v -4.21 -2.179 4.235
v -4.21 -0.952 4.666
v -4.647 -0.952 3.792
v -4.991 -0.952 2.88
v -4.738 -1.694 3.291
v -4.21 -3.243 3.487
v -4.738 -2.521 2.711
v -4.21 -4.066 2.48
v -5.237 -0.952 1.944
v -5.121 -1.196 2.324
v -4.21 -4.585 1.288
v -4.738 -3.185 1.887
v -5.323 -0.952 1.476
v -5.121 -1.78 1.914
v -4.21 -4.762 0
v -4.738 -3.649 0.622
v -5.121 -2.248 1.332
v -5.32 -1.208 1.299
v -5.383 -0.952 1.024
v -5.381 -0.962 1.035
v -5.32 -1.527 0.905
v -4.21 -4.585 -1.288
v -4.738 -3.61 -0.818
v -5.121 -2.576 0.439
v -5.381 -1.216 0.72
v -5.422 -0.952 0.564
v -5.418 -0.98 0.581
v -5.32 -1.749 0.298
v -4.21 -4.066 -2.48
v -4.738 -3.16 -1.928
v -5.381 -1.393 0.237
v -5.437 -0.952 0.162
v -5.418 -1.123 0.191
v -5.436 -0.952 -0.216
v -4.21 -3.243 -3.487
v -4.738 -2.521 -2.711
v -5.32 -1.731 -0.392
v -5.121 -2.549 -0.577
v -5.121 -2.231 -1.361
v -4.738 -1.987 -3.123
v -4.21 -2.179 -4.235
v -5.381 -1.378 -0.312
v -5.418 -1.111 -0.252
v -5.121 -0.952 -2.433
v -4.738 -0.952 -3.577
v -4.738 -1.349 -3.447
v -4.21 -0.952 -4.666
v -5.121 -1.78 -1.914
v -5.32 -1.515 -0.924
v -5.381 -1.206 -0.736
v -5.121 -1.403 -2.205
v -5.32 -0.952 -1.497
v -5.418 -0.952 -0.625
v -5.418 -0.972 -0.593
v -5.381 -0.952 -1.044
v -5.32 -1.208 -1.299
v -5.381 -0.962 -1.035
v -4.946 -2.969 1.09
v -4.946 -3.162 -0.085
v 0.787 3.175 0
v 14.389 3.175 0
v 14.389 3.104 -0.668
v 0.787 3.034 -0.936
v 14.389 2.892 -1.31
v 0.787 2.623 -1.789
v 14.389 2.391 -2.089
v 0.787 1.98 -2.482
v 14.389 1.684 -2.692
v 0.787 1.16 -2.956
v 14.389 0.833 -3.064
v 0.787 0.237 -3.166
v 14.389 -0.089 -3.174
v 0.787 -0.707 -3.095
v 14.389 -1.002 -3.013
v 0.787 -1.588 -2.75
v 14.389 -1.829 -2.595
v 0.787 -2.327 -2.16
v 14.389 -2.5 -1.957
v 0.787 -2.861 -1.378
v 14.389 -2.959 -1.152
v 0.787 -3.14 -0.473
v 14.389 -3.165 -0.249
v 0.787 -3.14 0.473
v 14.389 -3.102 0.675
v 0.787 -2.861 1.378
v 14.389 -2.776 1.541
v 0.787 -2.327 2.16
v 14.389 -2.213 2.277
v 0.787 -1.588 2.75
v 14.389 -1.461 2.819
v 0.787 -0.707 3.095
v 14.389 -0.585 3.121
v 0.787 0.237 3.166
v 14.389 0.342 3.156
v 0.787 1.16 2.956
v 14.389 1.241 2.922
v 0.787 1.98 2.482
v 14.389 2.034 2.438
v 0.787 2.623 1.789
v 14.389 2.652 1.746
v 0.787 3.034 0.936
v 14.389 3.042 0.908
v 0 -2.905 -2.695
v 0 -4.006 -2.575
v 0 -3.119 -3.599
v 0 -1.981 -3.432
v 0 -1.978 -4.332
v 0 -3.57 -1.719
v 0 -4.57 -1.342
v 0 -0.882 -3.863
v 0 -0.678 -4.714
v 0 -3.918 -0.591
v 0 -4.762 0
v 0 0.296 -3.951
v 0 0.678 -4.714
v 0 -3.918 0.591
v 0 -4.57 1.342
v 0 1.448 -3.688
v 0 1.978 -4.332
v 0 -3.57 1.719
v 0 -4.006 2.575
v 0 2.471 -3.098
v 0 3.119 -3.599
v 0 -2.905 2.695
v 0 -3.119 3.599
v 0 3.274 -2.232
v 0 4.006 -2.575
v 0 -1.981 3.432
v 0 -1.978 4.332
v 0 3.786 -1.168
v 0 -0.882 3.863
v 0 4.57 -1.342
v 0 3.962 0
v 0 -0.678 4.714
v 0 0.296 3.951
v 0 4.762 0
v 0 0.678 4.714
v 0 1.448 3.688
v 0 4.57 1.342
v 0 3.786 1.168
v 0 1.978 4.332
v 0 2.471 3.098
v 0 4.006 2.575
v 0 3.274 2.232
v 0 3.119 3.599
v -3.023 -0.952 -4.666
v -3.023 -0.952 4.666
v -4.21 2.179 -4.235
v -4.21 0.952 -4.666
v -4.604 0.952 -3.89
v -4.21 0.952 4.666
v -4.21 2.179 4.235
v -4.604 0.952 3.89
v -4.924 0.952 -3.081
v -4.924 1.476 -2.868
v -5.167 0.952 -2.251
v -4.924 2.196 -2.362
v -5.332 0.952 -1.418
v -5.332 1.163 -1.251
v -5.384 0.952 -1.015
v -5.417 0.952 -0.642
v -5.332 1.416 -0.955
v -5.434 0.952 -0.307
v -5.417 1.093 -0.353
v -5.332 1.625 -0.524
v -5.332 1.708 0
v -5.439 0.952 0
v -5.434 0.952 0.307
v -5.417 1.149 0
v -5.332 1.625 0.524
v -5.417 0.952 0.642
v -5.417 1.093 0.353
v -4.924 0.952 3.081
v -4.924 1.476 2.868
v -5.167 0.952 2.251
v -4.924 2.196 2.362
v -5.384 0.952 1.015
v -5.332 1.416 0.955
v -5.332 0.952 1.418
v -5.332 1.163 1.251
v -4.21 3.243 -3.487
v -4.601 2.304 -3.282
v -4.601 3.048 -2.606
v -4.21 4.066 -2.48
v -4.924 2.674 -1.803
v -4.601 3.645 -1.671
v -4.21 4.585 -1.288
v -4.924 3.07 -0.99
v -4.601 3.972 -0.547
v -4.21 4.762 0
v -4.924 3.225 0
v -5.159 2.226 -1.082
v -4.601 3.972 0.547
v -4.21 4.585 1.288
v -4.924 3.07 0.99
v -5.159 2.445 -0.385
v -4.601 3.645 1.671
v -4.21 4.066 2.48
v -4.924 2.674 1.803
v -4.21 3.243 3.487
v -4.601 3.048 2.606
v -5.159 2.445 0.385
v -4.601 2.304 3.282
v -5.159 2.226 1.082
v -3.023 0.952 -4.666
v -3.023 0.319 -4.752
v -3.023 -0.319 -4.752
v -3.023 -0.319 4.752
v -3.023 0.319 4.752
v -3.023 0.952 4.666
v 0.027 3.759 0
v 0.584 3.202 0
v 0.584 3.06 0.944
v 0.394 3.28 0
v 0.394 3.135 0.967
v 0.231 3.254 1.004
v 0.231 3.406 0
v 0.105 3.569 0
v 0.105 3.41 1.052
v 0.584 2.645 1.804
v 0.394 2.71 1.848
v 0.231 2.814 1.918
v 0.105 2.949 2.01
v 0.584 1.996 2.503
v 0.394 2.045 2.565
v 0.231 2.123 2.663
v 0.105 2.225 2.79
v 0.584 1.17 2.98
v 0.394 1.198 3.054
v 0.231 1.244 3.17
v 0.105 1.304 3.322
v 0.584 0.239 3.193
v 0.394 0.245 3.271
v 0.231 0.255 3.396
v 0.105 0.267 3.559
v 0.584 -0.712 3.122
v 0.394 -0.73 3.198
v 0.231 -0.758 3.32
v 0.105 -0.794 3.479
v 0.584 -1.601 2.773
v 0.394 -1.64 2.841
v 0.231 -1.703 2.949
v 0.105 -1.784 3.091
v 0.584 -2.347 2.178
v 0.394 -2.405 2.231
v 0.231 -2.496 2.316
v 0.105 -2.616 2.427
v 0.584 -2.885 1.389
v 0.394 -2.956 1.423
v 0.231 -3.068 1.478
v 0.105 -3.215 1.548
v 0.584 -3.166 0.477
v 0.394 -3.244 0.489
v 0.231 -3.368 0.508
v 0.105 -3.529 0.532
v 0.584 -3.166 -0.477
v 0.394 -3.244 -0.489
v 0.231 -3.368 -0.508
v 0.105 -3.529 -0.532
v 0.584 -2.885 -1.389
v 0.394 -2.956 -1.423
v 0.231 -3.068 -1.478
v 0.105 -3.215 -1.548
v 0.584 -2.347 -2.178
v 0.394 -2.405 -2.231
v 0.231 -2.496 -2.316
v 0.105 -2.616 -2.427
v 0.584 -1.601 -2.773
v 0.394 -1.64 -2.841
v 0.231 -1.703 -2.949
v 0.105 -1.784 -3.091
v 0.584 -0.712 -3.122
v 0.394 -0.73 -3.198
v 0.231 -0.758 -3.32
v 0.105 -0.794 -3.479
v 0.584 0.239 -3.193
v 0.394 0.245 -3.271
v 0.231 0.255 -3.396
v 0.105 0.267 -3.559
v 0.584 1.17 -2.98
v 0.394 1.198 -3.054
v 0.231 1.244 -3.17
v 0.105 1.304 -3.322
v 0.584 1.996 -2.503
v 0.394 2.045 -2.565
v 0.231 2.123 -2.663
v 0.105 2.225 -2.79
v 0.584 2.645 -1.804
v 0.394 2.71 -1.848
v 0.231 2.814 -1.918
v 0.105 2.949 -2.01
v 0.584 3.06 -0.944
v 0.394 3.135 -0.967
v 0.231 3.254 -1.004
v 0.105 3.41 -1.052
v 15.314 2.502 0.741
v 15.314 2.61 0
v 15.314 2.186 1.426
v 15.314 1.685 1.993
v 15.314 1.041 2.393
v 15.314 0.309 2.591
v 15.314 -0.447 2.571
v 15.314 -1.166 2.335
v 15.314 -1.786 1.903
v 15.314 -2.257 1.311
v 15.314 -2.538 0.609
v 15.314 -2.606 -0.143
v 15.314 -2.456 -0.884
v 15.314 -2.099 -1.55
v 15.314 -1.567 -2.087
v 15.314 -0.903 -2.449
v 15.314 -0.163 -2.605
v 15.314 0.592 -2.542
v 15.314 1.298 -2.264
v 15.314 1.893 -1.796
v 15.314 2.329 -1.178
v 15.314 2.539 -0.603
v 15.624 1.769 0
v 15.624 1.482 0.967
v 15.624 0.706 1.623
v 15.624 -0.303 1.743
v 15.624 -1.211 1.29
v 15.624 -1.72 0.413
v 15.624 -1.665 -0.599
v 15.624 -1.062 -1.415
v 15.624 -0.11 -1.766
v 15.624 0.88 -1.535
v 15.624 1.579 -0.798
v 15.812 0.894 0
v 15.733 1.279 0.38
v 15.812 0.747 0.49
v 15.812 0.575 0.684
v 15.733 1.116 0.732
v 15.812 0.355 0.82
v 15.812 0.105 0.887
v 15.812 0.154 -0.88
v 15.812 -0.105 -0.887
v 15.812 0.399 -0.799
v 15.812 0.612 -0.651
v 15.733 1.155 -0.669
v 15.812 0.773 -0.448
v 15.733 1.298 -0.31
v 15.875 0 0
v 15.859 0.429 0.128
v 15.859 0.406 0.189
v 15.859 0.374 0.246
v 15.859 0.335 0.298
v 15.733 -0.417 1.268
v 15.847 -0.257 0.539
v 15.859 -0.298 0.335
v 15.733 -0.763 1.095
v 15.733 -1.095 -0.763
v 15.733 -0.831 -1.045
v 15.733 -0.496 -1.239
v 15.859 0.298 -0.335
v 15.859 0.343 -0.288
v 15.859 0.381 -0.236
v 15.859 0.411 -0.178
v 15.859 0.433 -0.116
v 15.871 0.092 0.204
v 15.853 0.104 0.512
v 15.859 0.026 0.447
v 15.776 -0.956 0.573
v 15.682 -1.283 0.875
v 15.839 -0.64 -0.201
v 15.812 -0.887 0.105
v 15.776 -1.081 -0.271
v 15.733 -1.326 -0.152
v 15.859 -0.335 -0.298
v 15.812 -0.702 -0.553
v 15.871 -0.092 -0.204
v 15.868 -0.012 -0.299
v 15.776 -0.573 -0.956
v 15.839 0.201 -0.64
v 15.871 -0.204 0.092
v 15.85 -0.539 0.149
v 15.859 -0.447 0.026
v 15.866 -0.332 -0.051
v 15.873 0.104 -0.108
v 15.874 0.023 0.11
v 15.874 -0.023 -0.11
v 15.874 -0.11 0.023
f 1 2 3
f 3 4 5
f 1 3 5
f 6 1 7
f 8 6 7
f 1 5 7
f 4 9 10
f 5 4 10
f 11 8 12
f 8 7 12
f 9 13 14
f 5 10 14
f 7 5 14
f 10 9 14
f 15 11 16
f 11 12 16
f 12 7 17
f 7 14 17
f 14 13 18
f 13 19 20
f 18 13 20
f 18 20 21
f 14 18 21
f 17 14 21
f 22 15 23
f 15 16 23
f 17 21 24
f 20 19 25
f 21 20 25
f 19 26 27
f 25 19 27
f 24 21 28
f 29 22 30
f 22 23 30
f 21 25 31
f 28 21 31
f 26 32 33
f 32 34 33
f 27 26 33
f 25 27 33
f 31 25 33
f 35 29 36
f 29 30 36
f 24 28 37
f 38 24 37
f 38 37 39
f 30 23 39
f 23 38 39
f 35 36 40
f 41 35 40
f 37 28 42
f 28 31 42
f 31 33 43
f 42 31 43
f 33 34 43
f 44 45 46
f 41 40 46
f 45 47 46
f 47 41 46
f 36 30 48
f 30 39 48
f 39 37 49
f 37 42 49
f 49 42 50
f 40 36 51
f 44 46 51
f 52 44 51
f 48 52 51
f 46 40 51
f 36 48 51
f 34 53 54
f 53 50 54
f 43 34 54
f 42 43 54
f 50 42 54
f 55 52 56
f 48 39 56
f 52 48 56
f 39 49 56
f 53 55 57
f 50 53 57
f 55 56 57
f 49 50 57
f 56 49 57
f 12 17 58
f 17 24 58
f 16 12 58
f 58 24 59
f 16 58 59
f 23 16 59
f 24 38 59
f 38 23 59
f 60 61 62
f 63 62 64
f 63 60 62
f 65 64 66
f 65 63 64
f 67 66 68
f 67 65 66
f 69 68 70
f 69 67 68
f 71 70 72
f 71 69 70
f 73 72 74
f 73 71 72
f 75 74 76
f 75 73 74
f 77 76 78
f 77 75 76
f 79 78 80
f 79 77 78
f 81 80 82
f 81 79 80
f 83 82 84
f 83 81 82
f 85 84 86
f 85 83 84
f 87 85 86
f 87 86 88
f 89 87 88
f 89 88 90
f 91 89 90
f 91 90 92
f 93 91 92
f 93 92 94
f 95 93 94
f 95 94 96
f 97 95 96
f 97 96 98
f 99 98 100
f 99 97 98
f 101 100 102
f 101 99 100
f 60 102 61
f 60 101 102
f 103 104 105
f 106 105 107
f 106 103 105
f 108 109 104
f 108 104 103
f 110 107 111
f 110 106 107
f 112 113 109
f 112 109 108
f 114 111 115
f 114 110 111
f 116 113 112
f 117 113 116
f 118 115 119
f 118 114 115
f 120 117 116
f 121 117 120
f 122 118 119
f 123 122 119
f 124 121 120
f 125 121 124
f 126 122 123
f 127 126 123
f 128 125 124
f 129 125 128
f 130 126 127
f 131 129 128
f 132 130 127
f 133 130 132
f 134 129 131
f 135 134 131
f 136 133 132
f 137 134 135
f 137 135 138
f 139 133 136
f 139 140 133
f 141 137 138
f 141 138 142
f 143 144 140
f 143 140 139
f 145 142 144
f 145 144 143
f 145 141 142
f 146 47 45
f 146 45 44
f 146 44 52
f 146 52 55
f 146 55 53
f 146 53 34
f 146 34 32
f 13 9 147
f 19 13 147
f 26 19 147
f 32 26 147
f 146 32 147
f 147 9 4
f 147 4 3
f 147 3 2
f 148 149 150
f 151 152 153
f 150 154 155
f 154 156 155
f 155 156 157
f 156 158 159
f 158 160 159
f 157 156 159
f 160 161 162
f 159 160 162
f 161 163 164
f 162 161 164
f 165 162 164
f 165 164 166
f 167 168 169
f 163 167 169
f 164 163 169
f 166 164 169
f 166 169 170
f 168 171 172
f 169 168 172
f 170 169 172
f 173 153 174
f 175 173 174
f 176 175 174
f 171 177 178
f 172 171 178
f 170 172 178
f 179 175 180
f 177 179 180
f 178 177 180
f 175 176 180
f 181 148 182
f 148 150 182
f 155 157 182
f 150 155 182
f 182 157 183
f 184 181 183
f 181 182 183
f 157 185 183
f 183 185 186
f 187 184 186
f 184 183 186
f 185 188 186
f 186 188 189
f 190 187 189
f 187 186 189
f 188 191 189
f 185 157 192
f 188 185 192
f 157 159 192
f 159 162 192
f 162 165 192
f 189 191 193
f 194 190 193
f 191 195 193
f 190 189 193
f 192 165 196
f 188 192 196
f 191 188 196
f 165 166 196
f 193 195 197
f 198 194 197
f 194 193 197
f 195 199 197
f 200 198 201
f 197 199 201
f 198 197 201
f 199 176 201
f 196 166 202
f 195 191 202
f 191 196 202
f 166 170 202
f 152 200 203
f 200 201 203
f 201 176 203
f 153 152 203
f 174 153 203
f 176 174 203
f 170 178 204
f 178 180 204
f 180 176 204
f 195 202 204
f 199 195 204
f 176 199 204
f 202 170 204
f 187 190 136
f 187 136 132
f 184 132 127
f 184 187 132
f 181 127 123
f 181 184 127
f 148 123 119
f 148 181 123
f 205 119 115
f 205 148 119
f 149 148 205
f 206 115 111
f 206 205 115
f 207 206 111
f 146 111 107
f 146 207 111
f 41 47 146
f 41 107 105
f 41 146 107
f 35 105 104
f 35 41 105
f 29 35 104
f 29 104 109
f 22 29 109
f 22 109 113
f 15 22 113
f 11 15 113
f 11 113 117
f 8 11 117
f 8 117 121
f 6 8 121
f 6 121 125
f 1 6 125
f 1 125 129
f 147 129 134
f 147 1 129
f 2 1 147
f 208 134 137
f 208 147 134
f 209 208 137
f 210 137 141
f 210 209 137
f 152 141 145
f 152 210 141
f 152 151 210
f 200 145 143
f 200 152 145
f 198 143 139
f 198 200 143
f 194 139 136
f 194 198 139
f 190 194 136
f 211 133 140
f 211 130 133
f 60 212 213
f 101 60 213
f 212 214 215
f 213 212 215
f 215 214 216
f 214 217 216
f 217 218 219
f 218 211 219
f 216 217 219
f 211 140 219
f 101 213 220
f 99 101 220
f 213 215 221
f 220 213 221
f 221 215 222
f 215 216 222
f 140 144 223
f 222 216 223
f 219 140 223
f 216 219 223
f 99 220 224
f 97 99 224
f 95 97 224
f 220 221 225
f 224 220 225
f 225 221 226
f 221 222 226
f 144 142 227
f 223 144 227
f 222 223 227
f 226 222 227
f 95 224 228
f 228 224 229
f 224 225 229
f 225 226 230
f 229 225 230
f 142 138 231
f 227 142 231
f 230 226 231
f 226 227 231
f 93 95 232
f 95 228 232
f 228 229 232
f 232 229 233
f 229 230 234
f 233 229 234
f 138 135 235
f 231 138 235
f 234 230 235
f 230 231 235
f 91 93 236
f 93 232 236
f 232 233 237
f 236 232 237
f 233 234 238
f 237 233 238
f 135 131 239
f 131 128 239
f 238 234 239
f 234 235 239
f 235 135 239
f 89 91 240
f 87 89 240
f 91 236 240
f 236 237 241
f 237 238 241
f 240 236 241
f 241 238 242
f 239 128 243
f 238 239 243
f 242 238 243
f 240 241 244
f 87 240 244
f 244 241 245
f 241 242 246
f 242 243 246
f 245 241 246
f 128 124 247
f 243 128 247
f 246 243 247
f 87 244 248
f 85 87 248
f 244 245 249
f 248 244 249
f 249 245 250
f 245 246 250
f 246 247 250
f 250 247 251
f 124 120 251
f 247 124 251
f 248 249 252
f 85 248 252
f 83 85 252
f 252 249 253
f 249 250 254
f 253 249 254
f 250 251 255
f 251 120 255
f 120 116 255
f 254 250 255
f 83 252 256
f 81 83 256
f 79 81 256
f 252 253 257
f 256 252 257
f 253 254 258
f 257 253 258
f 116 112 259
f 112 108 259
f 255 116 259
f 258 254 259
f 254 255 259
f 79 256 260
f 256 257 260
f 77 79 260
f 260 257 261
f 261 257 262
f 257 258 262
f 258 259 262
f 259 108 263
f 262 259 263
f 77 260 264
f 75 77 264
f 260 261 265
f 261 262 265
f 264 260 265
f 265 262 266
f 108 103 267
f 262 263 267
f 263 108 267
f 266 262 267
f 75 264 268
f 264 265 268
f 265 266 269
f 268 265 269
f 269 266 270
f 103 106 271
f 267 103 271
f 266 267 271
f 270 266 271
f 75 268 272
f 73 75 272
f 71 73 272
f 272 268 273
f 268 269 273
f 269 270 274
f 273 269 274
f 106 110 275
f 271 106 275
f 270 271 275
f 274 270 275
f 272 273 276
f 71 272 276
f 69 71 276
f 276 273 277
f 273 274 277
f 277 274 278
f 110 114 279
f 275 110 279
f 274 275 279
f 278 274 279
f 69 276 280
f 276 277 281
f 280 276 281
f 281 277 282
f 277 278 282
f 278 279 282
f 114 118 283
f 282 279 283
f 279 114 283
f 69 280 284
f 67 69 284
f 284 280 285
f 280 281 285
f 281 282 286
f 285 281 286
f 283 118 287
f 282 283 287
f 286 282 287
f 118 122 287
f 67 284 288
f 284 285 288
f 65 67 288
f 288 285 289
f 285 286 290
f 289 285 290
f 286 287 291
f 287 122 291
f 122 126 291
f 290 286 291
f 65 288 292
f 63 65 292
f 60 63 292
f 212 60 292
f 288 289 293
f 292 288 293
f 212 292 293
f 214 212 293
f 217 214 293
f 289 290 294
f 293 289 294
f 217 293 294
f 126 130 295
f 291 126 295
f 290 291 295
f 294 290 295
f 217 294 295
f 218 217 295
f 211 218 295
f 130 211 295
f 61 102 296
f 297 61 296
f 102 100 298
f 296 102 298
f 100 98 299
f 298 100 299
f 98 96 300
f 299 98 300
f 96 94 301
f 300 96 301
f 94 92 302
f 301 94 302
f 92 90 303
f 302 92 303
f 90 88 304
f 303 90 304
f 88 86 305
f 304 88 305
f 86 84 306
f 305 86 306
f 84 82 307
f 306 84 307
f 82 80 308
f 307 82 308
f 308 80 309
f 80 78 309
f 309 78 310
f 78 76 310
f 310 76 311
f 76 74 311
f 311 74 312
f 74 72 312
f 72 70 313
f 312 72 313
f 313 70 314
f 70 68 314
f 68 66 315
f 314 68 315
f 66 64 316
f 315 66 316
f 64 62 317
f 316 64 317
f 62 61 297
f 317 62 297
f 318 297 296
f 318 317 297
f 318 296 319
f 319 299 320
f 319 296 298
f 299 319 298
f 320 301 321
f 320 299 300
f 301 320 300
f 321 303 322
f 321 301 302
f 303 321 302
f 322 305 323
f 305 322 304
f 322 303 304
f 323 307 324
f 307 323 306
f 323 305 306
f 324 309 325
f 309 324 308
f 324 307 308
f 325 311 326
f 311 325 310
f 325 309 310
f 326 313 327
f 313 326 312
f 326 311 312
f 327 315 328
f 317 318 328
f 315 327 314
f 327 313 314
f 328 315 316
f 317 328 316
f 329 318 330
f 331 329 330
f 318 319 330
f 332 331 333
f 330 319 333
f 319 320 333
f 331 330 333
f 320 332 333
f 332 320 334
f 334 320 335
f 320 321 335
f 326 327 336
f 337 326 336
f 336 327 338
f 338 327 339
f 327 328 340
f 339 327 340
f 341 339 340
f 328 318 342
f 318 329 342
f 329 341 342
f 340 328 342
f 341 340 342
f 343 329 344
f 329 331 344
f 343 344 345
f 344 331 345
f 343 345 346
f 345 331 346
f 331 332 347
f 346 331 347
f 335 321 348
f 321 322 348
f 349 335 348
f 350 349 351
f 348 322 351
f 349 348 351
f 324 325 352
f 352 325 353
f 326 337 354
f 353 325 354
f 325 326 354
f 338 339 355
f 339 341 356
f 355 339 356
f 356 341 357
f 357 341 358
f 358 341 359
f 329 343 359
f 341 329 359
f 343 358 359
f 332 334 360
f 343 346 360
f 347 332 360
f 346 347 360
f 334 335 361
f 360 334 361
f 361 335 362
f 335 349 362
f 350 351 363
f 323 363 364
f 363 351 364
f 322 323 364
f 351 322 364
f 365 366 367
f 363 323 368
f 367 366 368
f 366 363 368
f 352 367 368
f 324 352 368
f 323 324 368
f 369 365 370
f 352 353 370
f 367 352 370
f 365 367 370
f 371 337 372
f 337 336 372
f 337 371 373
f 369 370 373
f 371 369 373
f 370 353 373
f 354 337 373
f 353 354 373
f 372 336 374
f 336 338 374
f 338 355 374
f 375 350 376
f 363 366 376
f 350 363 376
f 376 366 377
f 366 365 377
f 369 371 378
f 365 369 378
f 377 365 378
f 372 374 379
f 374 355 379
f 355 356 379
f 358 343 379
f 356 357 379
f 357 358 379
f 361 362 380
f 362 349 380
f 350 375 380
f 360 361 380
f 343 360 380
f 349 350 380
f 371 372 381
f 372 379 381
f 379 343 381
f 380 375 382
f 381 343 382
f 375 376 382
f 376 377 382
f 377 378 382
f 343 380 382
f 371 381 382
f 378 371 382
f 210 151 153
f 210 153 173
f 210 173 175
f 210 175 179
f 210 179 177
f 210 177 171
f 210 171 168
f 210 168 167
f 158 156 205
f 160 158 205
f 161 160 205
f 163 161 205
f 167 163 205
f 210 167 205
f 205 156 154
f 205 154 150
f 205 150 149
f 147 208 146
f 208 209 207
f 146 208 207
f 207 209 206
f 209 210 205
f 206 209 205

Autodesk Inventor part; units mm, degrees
ref_plane "YZ Plane" through (0, 0, 0) normal (1, 0, 0) x (0, 1, 0)
sketch "Sketch1" plane through (0, 0, 0) normal (0, 0, 1) x (1, 0, 0)
  line L0 (-5.4864, 0) -> (15.875, 0)
  line L1 (15.875, 0) -> (15.875, 3.175)
  line L2 (15.875, 3.175) -> (3.175, 3.175)
  line L3 (3.175, 3.175) -> (2.413, 3.175)
  line L4 (2.413, 3.175) -> (0, 3.175)
  line L5 (0, 3.175) -> (0, 4.7625)
  line L6 (-10.1349, 0) -> (20.21, 0) projected
  line L7 (0, -0.9693) -> (0, 5.8158) projected
  line L8 (0, 4.7625) -> (-4.2103, 4.7625)
  arc A0 (-4.2103, 4.7625) -> (-5.4864, 0) centre (4.0386, 0) ccw
  line L9 (3.175, 3.175) -> (0, 3.175) construction
  dimension "d0" = 15.875
  dimension "d1" = 12.7
  dimension "d2" = 0.762
  dimension "d3" = 5.4864
  dimension "d4" = 6.35
  dimension "d5" = 6.35
  dimension "d9" = 9.525
  dimension "d10" = 0
  dimension "d13" = 9.525
revolve "Body" add sketch "Sketch1" angle 360 about axis through (-5.4864, 0, 0) along (1, 0, 0)
ref_plane "IDS_WORKPLANE{1}" through (-5.4864, 0, 0) normal (1, 0, 0) x (0, 0, -1)
sketch "Sketch2" plane through (-5.4864, 0, 0) normal (1, 0, 0) x (0, 0, -1)
  circle A0 centre (0, 0) radius 4.7625 projected
  line L0 (0, -6.6675) -> (0, 6.6675) projected
  line L1 (6.6675, 0) -> (-6.6675, 0) projected
  line L2 (-4.7625, 0.9525) -> (4.7625, 0.9525)
  line L3 (4.7625, 0.9525) -> (4.7625, -0.9525)
  line L4 (4.7625, -0.9525) -> (-4.7625, -0.9525)
  line L5 (-4.7625, -0.9525) -> (-4.7625, 0.9525)
  line L6 (-4.7625, 0) -> (4.7625, 0) construction
  line L7 (0, 0.9525) -> (0, -0.9525) construction
  dimension "d15" = 1.905
extrude "Slot" cut sketch "Sketch2" along normal blind 2.4638 contours L1 L0 L2 A0 | L3 L4 A0 | A0 L4 L0 L1 | A0 L2 L3 | L1 A0 L2 L0 | L0 L4 A0 L1 | L5 L2 A0 | A0 L4 L5
thread "Thread" size "1/4-20 UNC" class "2A" standard "ANSI Unified Screw Threads" length 12.7
sketch "Sketch3" plane through (0, 0, 0) normal (0, 0, 1) x (1, 0, 0)
  line L0 (15.875, 0) -> (15.875, 3.175) projected
  line L1 (15.875, 3.175) -> (3.175, 3.175) projected
  line L2 (-5.4864, 0) -> (15.875, 0) projected
  arc A0 (15.875, 0) -> (15.0243, 3.175) centre (9.525, 0) ccw
  line L3 (15.875, -3.175) -> (15.875, 3.175) projected
  line L4 (15.0243, 3.175) -> (15.0243, 0)
  line L5 (15.0243, 0) -> (15.875, 0)
  dimension "d40" = 6.35
revolve "Fillet1" cut sketch "Sketch3" angle 360 about axis through (-5.4864, 0, 0) along (1, 0, 0) contours A0 L1 L0
chamfer "Chamfer" distance 0.635 angle 45 1 edges at (15.0243, -3.175, 0)
ref_plane "Work Plane2" through (41.275, 0, 0) normal (0, 0, -1) x (1, 0, 0)
fillet "Fillet4" radius 0.7874 1 edges at (0, -3.175, 0)
equation "\"d0\" = NLG"
equation "\"d1\" = GEL"
equation "\"d2\" = GAL"
equation "\"d3\" = KOH"
equation "\"d4\" = GD"
equation "\"d5\" = BDM"
equation "\"d9\" = KOD"
equation "\"d13\" = KR"
equation "\"d15\" = SBR"
equation "\"d16\" = STI"
equation "\"d40\" = GD"
equation "\"d46\" = R"
equation "\"d11\" = GEL"
equation "\"d43\" = 0.5 * RR"
equation "\"GD\" = NND"
equation "\"NLG\" = 15.875"
equation "\"GEL\" = 12.7"
equation "\"KOD\" = 9.525"
equation "\"KOH\" = 5.4864"
equation "\"GAL\" = 0.762"
equation "\"BDM\" = NND"
equation "\"SBR\" = 1.905"
equation "\"STI\" = 2.4638"
equation "\"KEWI\" = 0"
equation "\"KR\" = KOD"
equation "\"d14\" = -KOH"
equation "\"R\" = 0.7874"
equation "\"THREADDIA\" = 6.35"
equation "\"TOA\" = 30deg"
equation "\"KOH1\" = 4.3688"
equation "\"NND\" = 6.35"
equation "\"GD1\" = 4.8387"
equation "\"THREADDESC\" = 1.2345"
equation "\"RR\" = 1.27"
properties part number "ANSI B18.6.2 - 1/4-20 UNC - 0.625, SFHCSI" material "Steel, Mild"
